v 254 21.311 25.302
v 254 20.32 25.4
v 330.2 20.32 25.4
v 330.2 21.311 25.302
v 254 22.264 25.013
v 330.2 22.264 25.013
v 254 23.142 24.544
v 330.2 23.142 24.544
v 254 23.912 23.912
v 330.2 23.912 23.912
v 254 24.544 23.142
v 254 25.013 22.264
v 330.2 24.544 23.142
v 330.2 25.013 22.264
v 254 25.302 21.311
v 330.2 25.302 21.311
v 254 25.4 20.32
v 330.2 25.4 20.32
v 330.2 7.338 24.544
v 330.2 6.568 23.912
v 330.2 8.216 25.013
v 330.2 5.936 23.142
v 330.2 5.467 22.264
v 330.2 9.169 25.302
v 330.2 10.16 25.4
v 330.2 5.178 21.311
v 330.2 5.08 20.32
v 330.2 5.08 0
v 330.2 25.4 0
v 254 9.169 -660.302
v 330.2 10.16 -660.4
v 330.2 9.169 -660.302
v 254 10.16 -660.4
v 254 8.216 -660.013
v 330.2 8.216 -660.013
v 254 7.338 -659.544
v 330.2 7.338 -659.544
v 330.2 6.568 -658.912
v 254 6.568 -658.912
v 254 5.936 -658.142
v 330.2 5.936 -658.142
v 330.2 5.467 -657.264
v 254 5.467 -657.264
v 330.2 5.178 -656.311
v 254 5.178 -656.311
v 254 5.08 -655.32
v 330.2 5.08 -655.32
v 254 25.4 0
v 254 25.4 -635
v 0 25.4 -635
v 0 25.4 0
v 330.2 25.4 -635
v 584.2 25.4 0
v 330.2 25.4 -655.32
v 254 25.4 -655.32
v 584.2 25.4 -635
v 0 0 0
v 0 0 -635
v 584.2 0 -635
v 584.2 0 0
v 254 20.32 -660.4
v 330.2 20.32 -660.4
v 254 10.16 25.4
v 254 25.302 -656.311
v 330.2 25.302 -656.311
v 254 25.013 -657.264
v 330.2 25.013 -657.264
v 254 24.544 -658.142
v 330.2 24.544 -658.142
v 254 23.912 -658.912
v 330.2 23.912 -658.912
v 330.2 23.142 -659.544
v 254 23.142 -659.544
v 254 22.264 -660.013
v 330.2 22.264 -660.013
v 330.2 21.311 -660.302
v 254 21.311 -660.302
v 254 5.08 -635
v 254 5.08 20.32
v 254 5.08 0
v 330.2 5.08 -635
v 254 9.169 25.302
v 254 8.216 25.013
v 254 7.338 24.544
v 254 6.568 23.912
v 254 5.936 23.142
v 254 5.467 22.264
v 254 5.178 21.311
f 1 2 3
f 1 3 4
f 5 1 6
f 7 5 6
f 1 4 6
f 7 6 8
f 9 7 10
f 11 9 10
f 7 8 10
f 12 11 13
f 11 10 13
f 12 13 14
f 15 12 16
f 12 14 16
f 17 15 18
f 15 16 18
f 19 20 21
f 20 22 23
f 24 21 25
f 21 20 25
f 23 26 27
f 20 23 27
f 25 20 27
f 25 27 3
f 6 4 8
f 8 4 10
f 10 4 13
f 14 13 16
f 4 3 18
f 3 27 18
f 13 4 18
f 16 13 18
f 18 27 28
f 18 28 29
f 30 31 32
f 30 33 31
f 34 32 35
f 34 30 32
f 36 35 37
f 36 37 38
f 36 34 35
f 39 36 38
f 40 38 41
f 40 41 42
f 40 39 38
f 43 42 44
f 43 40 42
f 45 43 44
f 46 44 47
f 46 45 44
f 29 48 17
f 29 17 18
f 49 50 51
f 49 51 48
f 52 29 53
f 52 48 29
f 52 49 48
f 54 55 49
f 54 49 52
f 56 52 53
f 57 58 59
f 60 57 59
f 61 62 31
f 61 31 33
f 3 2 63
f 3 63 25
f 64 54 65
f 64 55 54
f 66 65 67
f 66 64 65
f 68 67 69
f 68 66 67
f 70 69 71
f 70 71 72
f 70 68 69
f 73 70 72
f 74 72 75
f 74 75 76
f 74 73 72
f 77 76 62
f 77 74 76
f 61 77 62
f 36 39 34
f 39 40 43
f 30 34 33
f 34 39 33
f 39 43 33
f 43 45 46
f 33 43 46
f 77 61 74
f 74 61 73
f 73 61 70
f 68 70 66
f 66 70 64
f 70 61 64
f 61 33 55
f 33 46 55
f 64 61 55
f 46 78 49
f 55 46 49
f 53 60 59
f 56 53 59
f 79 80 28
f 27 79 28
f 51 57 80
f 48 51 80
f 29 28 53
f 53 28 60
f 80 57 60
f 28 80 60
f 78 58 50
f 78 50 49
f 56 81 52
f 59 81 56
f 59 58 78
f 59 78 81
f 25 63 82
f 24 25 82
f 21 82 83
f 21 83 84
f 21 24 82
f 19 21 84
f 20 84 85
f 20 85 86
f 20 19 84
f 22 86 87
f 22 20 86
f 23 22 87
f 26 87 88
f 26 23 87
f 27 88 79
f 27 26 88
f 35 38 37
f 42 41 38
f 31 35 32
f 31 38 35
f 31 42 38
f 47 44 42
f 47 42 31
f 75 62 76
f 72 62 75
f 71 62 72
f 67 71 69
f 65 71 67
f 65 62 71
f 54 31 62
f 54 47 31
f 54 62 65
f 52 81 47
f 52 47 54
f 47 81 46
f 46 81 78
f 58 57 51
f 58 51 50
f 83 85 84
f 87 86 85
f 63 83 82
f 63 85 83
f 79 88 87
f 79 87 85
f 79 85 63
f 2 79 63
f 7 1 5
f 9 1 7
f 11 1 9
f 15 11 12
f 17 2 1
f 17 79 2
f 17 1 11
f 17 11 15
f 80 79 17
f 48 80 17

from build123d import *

# Parameters (mm, degrees)
SKETCH1_W           = 584.2
SKETCH1_H           = 635
BOSS_EXTRUDE1_DEPTH = 25.4
SKETCH2_W           = 76.2
SKETCH2_H           = 20.32
BOSS_EXTRUDE2_DEPTH = 25.4
SKETCH3_W           = 76.2
SKETCH3_H           = 20.32
BOSS_EXTRUDE3_DEPTH = 25.4
FILLET1_R           = 5.08
FILLET2_R           = 5.08
FILLET3_R           = 5.08
FILLET4_R           = 5.08


with BuildPart() as part:
    # Sketch1 → Boss-Extrude1 (new body)
    with BuildSketch(Plane(origin=(0, 0, 0), x_dir=(1, 0, 0), z_dir=(0, 1, 0))):
        with Locations((292.1, 317.5)):
            Rectangle(SKETCH1_W, SKETCH1_H)
    extrude(amount=BOSS_EXTRUDE1_DEPTH)

    # Sketch2 → Boss-Extrude2 (add)
    with BuildSketch(Plane.XY):
        with Locations((292.1, 15.24)):
            Rectangle(SKETCH2_W, SKETCH2_H)
    extrude(amount=BOSS_EXTRUDE2_DEPTH)

    # Sketch3 → Boss-Extrude3 (add)
    with BuildSketch(Plane(origin=(0, 0, -635), x_dir=(-1, 0, 0), z_dir=(0, 0, -1))):
        with Locations((-292.1, 15.24)):
            Rectangle(SKETCH3_W, SKETCH3_H)
    extrude(amount=BOSS_EXTRUDE3_DEPTH)

    # Fillet1
    fillet1_edges = [part.edges().sort_by_distance(p)[0] for p in [
        (292.1, 25.4, -660.4),
    ]]
    fillet(fillet1_edges, radius=FILLET1_R)

    # Fillet2
    fillet2_edges = [part.edges().sort_by_distance(p)[0] for p in [
        (292.1, 5.08, -660.4),
    ]]
    fillet(fillet2_edges, radius=FILLET2_R)

    # Fillet3
    fillet3_edges = [part.edges().sort_by_distance(p)[0] for p in [
        (292.1, 5.08, 25.4),
    ]]
    fillet(fillet3_edges, radius=FILLET3_R)

    # Fillet4
    fillet4_edges = [part.edges().sort_by_distance(p)[0] for p in [
        (292.1, 25.4, 25.4),
    ]]
    fillet(fillet4_edges, radius=FILLET4_R)


solid = part.part
